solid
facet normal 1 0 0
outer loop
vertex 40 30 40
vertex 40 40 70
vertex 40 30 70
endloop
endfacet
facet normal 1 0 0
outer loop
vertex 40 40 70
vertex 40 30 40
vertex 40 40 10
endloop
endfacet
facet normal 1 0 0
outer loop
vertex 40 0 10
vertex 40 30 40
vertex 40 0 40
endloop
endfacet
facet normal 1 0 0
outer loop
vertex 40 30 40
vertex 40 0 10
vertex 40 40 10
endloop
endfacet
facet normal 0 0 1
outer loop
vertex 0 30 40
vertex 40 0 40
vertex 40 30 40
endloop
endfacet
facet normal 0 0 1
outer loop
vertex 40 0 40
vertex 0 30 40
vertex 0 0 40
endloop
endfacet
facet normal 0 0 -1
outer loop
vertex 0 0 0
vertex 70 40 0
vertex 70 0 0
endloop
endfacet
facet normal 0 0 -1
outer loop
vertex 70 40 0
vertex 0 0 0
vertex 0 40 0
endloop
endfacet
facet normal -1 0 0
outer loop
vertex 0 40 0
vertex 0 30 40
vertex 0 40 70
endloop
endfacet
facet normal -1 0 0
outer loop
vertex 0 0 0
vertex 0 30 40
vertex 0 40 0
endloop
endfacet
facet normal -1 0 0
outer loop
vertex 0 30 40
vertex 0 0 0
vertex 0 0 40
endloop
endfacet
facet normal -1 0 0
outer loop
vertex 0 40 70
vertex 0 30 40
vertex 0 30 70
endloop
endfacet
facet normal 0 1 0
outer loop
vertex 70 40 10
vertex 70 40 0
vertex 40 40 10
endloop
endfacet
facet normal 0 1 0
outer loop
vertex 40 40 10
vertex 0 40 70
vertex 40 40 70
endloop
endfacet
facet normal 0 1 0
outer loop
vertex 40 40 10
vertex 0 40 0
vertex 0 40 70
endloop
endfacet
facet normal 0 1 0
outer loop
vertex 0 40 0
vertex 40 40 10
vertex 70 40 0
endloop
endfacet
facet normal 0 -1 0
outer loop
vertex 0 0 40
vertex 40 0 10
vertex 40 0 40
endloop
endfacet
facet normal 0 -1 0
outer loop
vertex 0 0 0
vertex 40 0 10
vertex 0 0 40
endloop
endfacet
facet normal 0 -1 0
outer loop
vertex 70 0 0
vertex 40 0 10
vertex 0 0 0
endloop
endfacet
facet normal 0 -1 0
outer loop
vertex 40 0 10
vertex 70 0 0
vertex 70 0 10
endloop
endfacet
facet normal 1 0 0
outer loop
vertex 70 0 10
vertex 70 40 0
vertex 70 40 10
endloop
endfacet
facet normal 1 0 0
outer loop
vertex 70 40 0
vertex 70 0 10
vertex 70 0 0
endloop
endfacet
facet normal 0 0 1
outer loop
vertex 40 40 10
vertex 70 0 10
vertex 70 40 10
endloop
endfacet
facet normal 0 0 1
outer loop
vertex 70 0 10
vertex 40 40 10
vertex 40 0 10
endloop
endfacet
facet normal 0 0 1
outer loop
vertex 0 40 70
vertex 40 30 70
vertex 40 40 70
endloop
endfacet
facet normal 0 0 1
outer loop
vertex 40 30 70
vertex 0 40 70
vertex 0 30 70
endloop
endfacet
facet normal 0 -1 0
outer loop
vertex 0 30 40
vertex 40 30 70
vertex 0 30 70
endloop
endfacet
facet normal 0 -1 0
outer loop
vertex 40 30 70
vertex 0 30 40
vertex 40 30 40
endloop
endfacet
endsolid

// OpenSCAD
// Isometric_3.scad
// Produces 3 different and complex views

translate ([0,0,0])
cube ([40,40,40]);

translate ([40,0,0])
cube ([30,40,10]);

translate ([0,30,40])
cube ([40,10,30]);
